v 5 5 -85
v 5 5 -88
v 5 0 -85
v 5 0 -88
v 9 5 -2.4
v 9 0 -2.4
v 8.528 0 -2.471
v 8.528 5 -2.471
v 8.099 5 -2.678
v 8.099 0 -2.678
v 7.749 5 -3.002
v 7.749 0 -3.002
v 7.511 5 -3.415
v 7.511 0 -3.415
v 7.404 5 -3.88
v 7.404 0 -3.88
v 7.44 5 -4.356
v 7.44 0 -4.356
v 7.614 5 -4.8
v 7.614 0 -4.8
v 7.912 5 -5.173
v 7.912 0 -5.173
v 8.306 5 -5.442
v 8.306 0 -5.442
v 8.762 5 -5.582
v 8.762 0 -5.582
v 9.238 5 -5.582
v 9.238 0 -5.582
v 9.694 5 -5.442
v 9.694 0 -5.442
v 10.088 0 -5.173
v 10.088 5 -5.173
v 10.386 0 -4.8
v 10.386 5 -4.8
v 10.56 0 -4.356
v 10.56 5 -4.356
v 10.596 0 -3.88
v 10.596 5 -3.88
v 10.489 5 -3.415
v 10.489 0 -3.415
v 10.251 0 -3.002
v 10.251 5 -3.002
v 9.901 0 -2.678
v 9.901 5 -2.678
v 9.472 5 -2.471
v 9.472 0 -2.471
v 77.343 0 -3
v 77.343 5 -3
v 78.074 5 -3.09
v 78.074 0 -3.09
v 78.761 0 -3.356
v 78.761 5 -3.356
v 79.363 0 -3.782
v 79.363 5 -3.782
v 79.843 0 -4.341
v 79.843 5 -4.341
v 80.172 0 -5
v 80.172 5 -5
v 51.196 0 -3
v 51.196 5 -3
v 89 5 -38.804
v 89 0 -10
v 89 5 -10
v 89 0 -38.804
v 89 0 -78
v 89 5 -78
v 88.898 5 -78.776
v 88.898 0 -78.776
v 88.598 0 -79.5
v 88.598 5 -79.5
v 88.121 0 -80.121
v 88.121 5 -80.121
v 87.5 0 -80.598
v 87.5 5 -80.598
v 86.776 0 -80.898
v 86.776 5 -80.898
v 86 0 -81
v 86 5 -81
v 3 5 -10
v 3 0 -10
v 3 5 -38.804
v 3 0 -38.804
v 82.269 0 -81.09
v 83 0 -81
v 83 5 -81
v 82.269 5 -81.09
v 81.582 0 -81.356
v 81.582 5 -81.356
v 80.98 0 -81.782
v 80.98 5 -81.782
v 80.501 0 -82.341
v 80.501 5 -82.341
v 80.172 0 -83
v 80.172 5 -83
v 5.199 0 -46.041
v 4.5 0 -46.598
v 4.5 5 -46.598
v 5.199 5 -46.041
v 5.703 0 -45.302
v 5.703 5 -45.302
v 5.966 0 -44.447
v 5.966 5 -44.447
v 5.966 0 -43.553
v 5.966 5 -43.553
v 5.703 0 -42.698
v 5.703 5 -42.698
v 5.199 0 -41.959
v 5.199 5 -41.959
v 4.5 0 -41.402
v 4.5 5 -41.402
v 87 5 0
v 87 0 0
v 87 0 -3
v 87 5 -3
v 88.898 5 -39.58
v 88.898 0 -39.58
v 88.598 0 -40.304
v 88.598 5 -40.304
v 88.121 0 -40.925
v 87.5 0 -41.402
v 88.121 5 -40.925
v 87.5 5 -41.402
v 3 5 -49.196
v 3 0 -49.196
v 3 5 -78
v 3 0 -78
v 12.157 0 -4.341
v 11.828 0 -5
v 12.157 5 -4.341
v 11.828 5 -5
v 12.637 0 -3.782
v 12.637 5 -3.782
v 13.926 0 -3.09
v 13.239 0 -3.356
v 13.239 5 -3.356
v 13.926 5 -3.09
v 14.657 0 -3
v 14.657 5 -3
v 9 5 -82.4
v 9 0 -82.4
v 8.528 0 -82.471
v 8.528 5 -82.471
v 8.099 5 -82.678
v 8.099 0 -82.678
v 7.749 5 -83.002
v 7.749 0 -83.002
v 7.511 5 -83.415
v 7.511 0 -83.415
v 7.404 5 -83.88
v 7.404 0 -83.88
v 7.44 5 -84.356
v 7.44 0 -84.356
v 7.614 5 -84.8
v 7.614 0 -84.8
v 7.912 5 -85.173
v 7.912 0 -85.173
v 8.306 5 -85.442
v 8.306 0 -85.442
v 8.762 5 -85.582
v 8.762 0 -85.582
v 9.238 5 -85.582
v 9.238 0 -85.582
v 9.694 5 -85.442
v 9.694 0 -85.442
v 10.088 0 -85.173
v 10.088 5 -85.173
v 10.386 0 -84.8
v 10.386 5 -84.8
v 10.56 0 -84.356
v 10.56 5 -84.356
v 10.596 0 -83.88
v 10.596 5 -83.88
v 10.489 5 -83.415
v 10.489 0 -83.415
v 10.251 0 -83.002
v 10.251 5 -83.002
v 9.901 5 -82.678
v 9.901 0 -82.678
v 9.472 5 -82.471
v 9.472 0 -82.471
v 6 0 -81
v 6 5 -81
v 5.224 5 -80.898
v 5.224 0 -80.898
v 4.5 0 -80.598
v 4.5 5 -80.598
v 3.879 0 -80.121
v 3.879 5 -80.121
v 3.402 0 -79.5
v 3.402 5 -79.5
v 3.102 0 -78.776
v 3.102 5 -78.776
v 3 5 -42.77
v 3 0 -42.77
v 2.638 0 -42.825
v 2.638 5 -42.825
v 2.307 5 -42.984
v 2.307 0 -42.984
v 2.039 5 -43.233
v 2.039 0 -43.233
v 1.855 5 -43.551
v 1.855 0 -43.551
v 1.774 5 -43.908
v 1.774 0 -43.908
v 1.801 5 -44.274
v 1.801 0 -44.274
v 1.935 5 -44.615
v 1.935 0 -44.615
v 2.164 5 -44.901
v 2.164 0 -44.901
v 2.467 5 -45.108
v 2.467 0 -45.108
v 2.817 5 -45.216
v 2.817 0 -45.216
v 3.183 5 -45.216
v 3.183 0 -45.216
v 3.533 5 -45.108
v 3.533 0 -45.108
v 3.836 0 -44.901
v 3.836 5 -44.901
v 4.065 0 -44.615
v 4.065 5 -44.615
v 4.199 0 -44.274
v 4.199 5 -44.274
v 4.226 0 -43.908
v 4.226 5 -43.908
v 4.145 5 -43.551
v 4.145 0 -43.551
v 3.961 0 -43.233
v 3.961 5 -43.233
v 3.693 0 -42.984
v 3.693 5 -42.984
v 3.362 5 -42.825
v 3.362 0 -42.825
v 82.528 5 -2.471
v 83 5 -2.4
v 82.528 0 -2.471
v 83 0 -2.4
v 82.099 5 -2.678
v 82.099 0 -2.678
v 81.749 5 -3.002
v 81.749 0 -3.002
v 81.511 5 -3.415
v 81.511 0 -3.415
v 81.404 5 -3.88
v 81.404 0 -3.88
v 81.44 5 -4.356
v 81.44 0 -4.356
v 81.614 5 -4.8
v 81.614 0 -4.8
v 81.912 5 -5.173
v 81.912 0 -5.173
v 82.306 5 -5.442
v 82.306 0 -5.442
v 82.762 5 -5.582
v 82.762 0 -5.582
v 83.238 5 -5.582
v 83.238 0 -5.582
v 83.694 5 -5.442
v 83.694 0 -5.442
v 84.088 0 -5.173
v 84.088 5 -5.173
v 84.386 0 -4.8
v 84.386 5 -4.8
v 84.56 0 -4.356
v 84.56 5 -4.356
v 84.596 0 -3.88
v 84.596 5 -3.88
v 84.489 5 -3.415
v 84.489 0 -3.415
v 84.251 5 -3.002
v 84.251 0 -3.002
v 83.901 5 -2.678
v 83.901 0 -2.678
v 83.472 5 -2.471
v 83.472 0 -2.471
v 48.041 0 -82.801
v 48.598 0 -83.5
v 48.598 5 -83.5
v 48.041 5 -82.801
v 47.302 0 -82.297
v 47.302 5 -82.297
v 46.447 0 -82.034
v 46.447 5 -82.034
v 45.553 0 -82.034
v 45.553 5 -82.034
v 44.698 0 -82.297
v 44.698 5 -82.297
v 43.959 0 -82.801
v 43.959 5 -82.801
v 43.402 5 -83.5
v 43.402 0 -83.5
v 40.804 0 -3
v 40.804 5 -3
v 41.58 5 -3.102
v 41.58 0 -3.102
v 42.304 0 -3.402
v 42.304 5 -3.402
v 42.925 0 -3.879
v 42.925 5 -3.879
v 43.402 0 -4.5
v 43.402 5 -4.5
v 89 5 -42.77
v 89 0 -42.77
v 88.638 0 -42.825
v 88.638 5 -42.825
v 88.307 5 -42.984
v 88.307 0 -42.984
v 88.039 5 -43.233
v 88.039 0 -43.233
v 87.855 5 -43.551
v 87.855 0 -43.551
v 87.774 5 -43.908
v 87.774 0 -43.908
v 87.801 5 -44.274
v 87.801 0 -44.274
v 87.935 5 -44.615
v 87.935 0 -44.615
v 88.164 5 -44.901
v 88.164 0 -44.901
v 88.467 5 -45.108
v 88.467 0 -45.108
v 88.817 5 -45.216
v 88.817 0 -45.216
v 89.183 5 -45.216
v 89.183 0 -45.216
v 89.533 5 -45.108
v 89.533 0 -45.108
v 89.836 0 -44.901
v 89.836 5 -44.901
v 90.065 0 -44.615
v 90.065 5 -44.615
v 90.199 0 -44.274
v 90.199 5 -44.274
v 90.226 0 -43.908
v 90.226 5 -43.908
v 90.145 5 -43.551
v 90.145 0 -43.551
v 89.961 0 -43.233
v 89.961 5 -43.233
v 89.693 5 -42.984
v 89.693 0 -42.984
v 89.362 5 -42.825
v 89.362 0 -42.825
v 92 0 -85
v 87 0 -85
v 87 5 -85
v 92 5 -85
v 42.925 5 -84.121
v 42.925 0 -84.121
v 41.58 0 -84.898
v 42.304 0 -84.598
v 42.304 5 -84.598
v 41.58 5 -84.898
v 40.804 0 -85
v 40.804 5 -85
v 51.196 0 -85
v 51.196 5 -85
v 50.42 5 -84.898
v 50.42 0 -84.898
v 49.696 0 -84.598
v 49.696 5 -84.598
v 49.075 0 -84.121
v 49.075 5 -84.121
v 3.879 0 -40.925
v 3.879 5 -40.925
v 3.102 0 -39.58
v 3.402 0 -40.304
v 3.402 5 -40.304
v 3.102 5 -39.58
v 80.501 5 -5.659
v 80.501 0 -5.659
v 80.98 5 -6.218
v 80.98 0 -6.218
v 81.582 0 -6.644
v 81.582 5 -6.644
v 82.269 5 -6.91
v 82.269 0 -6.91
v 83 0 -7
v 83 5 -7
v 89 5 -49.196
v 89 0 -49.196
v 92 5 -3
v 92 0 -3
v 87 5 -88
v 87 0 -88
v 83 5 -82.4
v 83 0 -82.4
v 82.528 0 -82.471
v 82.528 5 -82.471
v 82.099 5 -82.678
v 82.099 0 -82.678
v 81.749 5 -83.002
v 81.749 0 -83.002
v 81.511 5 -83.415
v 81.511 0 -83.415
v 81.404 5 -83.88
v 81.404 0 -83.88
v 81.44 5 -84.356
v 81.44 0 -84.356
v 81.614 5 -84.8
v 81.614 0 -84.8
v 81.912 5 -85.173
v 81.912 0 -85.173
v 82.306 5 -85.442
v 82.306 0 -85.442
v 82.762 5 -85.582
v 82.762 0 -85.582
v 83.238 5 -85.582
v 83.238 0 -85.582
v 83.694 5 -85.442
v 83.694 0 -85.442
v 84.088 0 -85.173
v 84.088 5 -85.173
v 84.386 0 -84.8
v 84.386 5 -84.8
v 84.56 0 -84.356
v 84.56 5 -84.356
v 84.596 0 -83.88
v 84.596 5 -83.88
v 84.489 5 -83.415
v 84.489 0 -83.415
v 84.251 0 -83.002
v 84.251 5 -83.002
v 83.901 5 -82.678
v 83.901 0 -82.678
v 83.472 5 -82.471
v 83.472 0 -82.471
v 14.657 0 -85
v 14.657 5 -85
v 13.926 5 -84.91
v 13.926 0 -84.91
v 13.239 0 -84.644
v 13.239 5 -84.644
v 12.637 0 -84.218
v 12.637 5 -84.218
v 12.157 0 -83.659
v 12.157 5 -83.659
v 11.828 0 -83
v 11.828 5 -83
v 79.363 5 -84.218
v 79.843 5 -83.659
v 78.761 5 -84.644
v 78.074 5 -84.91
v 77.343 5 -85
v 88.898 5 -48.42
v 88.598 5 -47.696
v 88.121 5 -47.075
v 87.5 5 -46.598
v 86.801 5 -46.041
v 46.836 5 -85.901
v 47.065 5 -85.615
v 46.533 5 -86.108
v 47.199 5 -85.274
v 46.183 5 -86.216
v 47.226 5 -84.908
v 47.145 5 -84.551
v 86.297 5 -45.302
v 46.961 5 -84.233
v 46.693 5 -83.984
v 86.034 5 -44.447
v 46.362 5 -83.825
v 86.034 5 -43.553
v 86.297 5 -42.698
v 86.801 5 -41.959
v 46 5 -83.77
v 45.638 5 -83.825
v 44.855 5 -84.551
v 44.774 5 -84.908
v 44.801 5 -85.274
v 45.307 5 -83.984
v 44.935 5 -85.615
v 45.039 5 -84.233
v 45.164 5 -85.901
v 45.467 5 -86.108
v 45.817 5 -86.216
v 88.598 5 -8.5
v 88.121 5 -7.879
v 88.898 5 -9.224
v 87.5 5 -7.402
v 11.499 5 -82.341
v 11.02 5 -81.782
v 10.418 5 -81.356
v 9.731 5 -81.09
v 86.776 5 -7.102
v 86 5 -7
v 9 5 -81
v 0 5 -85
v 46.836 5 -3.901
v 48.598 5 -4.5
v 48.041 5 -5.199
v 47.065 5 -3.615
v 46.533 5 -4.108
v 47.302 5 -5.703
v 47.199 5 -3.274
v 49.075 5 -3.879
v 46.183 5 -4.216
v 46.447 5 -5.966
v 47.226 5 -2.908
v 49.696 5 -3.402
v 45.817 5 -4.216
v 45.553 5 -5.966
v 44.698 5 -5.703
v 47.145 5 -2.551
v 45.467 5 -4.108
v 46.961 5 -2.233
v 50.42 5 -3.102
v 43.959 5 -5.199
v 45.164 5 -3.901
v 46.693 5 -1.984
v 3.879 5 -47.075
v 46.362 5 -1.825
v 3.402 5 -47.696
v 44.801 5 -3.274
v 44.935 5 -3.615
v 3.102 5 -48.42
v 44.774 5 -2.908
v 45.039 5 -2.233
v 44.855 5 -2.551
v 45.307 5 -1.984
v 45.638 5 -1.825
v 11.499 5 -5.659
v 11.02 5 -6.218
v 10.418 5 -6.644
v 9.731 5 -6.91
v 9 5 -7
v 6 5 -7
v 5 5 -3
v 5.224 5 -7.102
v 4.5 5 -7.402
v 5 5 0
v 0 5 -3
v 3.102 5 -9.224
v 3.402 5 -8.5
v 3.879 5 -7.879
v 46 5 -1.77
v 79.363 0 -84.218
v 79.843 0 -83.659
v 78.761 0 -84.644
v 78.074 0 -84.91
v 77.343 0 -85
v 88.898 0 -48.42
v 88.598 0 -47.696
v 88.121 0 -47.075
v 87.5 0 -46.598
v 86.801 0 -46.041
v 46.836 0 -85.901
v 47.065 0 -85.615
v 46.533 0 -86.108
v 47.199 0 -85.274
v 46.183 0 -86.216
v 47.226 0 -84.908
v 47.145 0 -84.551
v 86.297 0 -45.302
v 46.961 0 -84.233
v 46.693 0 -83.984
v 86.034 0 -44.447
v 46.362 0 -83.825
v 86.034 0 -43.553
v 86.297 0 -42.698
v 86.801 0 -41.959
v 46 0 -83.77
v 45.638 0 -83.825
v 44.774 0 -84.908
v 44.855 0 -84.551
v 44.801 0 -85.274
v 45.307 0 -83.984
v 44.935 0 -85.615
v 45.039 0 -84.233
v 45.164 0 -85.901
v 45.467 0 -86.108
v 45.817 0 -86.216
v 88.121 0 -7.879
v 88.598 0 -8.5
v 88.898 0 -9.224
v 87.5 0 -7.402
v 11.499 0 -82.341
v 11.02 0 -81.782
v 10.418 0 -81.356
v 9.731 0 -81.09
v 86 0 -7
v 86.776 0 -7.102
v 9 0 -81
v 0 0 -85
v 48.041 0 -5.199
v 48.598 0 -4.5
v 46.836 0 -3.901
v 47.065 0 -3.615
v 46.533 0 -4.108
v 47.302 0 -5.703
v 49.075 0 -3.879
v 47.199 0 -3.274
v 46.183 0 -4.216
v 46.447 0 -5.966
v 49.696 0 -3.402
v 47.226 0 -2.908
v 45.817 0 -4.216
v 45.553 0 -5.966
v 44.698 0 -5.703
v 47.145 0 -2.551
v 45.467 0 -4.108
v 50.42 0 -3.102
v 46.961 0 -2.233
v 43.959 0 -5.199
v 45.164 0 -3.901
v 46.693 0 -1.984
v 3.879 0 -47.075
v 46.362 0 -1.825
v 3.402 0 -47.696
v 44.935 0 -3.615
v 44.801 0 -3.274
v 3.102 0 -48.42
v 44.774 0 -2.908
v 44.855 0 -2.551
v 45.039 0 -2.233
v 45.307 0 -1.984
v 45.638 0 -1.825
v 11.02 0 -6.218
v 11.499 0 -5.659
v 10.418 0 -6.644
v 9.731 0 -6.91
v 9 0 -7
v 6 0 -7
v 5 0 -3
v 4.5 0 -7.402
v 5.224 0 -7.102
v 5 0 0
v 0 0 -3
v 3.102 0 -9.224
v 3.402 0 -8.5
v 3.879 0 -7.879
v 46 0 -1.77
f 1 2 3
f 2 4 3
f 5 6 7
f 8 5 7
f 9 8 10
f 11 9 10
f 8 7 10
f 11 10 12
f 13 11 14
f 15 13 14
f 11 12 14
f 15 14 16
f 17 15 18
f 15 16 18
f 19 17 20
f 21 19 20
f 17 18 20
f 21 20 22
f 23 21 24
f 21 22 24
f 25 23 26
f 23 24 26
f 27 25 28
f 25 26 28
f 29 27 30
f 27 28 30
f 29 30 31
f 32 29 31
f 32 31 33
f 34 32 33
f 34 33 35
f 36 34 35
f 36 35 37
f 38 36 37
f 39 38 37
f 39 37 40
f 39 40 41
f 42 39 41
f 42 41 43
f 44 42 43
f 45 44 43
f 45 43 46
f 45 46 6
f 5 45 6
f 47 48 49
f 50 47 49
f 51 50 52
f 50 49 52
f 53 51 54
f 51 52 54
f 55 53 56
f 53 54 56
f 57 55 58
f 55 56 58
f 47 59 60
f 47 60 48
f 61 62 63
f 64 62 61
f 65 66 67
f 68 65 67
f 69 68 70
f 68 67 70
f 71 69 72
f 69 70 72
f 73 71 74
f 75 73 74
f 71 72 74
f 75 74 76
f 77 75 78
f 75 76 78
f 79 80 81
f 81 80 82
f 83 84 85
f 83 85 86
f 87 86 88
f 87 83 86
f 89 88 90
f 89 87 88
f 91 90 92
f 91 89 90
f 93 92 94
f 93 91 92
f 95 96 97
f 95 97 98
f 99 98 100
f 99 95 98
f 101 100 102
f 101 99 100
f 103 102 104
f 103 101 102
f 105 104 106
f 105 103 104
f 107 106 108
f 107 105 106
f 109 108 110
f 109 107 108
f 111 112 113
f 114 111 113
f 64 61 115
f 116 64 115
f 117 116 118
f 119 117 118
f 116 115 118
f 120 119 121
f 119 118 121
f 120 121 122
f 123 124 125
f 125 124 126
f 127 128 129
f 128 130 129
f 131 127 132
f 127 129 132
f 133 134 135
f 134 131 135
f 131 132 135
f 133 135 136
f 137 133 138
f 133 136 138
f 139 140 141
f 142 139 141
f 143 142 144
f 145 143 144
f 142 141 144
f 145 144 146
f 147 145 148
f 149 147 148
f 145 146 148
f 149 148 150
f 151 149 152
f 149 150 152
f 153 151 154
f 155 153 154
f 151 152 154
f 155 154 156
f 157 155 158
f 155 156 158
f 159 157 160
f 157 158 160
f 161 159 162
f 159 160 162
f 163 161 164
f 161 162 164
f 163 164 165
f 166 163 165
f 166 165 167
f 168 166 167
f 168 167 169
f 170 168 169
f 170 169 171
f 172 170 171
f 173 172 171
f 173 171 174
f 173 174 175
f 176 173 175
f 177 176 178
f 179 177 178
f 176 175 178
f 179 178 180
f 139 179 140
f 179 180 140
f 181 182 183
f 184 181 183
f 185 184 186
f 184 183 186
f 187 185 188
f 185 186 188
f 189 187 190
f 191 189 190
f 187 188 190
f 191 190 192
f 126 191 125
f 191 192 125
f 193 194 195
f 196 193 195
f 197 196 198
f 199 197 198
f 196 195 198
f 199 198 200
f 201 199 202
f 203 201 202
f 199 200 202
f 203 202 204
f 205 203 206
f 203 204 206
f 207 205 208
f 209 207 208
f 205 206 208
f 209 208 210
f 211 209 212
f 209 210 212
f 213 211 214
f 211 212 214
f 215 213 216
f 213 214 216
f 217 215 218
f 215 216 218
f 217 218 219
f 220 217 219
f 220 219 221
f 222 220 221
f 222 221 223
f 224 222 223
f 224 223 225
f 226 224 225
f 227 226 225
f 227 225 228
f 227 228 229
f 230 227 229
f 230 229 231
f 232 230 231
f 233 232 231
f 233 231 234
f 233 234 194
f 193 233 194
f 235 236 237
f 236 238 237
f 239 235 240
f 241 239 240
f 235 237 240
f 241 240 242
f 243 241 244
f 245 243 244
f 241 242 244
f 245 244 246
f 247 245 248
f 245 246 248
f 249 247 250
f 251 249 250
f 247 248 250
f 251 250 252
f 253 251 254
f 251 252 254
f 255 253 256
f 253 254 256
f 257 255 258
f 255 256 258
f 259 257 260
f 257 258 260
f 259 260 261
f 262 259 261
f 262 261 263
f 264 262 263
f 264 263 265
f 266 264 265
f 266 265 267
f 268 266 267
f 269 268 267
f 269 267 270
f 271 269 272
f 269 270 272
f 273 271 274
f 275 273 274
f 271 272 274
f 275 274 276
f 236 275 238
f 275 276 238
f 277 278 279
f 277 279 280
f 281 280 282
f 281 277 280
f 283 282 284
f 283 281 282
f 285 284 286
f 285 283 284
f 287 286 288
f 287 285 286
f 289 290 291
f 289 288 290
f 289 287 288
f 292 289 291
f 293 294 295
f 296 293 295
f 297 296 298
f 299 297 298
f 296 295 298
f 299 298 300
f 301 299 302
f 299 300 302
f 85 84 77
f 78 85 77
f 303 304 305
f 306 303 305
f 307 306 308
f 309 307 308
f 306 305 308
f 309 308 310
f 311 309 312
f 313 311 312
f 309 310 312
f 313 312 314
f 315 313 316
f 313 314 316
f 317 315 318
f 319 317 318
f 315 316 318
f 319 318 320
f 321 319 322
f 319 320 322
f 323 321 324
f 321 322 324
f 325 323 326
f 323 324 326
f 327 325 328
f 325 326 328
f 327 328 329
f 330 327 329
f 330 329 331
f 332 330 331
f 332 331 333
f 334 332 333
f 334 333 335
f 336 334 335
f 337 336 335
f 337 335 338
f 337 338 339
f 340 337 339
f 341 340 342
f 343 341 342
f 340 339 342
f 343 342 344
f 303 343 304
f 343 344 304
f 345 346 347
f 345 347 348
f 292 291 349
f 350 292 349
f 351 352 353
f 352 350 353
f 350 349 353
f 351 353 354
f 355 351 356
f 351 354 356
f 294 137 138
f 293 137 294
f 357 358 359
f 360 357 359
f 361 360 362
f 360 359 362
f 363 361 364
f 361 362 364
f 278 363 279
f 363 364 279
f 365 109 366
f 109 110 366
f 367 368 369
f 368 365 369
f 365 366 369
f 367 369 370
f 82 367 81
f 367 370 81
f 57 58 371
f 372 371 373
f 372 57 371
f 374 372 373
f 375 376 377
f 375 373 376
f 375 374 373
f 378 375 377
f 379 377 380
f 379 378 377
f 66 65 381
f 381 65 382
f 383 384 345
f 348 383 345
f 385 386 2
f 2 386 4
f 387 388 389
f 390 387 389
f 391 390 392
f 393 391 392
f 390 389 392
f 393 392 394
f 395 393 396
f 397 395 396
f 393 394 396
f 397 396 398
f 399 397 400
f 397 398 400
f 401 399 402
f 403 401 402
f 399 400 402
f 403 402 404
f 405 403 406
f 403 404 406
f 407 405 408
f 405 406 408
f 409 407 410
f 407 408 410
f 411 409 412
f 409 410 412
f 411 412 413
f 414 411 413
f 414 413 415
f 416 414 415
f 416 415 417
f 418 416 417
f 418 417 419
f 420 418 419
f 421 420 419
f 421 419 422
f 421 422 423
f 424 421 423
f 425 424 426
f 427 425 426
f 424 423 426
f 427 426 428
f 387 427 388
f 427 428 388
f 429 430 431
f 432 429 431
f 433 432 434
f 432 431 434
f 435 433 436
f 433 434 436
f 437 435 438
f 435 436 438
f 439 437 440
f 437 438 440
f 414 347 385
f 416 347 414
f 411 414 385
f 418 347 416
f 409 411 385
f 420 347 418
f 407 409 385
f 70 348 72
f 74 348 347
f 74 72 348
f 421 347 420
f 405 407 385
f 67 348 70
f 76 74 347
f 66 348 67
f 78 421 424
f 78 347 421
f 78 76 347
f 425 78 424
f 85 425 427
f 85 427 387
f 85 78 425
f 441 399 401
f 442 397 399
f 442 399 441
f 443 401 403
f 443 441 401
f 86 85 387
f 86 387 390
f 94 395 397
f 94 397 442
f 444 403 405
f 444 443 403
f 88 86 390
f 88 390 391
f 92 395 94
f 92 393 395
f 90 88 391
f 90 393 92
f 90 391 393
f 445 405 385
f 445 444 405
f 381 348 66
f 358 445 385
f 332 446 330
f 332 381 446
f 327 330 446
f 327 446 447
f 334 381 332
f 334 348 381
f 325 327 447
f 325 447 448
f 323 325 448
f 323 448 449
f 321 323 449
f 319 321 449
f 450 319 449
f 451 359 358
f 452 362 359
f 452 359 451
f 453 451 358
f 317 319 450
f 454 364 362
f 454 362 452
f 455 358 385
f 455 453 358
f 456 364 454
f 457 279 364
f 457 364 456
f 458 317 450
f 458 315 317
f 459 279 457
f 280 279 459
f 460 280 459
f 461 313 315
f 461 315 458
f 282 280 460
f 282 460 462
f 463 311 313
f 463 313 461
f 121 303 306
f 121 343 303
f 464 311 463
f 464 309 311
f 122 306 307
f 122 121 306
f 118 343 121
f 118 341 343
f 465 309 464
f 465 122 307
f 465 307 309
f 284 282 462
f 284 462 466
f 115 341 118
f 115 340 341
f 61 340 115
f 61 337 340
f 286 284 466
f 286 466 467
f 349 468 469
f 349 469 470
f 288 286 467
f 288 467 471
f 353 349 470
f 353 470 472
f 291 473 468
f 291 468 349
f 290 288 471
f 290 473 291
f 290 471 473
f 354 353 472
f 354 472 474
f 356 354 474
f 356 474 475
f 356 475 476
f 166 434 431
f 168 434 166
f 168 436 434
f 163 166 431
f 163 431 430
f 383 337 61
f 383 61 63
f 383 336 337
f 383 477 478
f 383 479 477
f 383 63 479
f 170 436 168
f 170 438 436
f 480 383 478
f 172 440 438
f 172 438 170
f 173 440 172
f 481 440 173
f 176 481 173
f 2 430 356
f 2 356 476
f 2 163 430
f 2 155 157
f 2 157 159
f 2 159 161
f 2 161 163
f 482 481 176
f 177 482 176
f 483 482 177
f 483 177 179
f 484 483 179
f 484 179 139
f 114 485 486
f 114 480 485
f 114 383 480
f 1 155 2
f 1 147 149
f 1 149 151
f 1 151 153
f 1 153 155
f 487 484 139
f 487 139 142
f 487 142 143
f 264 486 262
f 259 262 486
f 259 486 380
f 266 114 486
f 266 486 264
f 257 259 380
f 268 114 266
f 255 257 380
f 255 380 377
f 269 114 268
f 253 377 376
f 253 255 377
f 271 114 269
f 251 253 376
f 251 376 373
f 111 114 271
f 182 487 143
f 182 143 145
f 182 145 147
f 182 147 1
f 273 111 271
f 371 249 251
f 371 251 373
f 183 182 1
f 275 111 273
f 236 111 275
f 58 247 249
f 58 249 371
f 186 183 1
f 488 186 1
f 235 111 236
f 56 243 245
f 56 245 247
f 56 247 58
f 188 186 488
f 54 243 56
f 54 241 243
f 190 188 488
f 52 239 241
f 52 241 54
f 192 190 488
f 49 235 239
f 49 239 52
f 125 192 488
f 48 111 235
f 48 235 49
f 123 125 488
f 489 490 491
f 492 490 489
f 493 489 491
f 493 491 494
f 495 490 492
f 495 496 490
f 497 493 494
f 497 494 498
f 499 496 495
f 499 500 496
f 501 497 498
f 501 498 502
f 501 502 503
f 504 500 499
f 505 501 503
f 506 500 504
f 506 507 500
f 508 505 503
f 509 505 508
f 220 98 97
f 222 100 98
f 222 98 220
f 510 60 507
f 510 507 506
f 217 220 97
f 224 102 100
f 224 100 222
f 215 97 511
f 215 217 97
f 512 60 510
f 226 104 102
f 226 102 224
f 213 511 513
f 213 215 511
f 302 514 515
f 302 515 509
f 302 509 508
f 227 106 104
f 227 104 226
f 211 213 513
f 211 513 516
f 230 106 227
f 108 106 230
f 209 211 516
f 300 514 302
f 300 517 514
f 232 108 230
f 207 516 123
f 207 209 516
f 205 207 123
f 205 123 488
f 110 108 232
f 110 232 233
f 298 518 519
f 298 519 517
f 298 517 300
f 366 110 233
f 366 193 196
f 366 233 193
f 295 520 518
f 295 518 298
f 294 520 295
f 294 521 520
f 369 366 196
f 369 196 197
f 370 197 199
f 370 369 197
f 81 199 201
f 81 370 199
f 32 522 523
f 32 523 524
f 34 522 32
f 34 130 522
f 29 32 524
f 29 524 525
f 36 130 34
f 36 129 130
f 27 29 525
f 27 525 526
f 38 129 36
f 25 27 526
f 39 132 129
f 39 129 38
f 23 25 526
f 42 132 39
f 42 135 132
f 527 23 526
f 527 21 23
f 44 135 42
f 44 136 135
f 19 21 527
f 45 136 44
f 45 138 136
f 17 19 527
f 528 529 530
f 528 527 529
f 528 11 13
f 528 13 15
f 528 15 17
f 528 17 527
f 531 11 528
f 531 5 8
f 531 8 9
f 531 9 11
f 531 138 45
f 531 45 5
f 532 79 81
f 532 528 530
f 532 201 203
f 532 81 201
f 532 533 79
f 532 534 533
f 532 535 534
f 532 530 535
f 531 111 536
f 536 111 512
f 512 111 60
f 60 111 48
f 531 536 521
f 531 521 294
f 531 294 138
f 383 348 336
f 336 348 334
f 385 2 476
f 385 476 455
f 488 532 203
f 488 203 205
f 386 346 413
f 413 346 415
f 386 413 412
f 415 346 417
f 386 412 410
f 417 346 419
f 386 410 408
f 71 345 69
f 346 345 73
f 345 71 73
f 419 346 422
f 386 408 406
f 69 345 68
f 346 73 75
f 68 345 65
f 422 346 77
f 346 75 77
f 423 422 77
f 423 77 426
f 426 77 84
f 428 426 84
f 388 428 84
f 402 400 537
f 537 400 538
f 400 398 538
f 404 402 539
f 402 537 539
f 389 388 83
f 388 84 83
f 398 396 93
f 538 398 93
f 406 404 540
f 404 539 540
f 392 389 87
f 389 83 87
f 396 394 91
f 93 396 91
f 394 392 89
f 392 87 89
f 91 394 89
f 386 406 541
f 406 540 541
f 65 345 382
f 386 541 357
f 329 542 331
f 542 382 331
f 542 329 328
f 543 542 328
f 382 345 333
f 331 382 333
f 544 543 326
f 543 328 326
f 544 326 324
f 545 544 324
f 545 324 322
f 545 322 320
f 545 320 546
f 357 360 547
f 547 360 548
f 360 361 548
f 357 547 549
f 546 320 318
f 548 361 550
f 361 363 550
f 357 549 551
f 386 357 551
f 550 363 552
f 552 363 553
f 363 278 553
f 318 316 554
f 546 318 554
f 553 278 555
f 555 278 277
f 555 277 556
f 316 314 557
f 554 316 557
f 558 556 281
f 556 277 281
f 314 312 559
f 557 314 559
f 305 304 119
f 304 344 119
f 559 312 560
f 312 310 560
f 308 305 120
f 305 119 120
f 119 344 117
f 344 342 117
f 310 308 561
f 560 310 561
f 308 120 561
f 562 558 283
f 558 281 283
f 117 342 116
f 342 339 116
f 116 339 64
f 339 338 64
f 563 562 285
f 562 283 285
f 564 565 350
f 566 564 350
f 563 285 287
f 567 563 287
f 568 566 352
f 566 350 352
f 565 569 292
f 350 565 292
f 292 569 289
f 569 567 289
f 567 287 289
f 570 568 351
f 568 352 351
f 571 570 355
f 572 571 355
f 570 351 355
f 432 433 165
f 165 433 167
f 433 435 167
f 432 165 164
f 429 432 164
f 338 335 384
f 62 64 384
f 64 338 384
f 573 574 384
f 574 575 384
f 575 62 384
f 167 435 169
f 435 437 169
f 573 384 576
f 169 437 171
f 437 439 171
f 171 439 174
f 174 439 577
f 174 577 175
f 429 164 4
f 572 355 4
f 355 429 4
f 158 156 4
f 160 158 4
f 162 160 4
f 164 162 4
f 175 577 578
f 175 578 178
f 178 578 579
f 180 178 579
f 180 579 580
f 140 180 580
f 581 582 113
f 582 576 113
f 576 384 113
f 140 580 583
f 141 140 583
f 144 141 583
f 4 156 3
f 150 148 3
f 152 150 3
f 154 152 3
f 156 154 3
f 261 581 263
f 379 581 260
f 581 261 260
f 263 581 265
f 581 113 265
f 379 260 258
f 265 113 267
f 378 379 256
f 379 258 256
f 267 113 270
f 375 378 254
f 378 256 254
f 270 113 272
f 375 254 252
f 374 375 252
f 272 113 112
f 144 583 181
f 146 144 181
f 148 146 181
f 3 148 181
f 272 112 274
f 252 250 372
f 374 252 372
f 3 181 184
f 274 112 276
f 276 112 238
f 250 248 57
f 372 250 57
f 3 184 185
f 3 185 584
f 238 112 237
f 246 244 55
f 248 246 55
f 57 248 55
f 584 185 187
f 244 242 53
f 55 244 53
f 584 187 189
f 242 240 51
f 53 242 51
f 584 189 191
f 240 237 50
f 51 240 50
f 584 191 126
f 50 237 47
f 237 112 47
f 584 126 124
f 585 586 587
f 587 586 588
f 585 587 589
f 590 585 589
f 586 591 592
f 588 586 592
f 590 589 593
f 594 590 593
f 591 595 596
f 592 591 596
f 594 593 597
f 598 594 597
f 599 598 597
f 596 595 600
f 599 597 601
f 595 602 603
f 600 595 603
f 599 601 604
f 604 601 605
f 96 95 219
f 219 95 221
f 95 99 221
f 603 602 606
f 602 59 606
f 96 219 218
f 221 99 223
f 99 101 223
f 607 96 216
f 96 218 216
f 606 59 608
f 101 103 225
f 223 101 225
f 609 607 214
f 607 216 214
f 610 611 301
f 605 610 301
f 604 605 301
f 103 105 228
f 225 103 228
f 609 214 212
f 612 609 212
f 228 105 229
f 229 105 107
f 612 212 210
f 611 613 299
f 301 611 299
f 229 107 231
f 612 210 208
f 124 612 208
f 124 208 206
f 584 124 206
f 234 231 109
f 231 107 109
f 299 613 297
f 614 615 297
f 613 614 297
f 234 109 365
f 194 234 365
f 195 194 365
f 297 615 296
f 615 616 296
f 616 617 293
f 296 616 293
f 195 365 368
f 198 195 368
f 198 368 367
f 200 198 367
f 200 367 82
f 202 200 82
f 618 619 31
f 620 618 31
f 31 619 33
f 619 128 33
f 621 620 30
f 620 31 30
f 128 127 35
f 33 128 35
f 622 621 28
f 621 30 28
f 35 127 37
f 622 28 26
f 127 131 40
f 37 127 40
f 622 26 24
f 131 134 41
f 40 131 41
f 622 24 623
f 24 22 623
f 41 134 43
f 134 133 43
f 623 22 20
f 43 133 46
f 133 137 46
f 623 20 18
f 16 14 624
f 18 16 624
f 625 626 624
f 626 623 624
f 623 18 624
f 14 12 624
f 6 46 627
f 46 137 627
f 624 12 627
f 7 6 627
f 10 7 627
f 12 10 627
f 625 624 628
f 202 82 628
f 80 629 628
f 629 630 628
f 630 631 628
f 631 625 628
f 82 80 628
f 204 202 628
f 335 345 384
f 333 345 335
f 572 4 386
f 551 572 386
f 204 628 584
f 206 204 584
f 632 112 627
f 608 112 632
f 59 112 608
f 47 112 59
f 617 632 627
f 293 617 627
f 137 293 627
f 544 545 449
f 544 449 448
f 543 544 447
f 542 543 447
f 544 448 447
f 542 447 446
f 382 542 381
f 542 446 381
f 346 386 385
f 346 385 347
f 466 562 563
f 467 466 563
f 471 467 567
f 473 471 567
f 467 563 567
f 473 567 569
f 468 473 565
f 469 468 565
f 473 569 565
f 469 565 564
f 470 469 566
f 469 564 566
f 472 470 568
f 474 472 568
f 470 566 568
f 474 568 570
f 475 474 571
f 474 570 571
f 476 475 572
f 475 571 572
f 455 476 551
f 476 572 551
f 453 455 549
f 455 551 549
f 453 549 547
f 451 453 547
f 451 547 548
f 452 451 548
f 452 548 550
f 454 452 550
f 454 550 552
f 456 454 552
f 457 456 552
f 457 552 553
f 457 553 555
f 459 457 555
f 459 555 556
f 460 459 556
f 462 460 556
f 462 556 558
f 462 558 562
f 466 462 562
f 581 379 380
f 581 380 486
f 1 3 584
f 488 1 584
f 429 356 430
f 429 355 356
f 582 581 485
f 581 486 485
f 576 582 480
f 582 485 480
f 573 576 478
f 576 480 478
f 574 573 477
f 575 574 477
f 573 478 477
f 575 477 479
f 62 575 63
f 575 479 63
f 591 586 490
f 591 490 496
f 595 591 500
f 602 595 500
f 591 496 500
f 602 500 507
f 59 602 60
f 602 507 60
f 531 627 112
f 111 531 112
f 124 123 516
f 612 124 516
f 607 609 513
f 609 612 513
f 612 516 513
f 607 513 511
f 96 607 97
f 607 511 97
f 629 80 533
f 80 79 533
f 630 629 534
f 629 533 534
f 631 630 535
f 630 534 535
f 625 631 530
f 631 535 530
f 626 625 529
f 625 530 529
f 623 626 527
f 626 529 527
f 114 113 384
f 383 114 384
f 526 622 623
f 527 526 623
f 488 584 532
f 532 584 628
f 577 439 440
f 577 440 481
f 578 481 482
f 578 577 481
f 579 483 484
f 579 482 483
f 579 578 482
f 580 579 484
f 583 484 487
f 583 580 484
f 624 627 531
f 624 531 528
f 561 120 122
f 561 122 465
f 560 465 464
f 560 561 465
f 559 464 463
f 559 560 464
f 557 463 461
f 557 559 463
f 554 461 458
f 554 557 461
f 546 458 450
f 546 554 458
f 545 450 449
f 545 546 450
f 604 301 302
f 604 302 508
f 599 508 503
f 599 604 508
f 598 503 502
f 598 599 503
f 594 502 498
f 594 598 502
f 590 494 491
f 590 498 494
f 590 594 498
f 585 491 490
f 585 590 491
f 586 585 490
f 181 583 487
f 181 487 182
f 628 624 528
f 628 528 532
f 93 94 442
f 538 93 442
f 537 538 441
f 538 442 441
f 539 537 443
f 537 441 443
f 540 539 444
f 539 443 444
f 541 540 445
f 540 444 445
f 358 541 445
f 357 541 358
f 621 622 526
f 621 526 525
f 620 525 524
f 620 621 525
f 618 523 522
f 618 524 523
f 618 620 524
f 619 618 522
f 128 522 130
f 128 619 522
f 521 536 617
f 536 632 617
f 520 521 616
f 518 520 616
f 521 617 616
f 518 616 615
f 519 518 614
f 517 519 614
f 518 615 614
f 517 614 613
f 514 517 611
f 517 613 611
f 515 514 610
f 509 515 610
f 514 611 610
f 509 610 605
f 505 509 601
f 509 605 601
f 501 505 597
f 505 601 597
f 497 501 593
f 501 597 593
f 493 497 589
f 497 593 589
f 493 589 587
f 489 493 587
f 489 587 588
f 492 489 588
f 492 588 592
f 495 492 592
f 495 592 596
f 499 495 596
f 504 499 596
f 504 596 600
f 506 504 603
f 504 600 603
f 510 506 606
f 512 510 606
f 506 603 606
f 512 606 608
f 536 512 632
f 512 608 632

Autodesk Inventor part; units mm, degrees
ref_plane "YZ Plane" through (0, 0, 0) normal (1, 0, 0) x (0, 1, 0)
ref_plane "XZ Plane" through (0, 0, 0) normal (0, 1, 0) x (-1, 0, 0)
ref_plane "XY Plane" through (0, 0, 0) normal (0, 0, 1) x (1, 0, 0)
sketch "Sketch1" plane through (0, 0, 0) normal (0, 1, 0) x (-1, 0, 0)
  line L0 (0, 0) -> (-92, 0)
  line L1 (-92, 0) -> (-92, -88)
  line L2 (-92, -88) -> (0, -88)
  line L3 (0, -88) -> (0, 0)
  line L4 (0, -88) -> (-5, -88)
  line L5 (-5, -88) -> (-5, -85)
  line L6 (-5, -85) -> (0, -85)
  line L7 (0, -85) -> (0, -88)
  line L8 (0, 0) -> (-5, 0)
  line L9 (-5, 0) -> (-5, -3)
  line L10 (-5, -3) -> (0, -3)
  line L11 (0, -3) -> (0, 0)
  line L12 (-92, 0) -> (-87, 0)
  line L13 (-87, 0) -> (-87, -3)
  line L14 (-87, -3) -> (-92, -3)
  line L15 (-92, -3) -> (-92, 0)
  line L16 (-92, -88) -> (-87, -88)
  line L17 (-87, -88) -> (-87, -85)
  line L18 (-87, -85) -> (-92, -85)
  line L19 (-92, -85) -> (-92, -88)
  circle A0 centre (-9, -84) radius 1.6 construction
  circle A1 centre (-83, -84) radius 1.6 construction
  circle A2 centre (-9, -4) radius 1.6 construction
  circle A3 centre (-83, -4) radius 1.6 construction
  circle A4 centre (-46, -85) radius 1.6 construction
  circle A5 centre (-3, -44) radius 1.6 construction
  circle A6 centre (-89, -44) radius 1.6 construction
  circle A7 centre (-46, -3) radius 1.6 construction
  circle A8 centre (-9, -84) radius 3
  circle A9 centre (-46, -85) radius 3
  circle A10 centre (-83, -84) radius 3
  circle A11 centre (-3, -44) radius 3
  circle A12 centre (-9, -4) radius 3
  circle A13 centre (-83, -4) radius 3
  circle A14 centre (-89, -44) radius 3
  circle A15 centre (-46, -3) radius 3
  line L20 (-11.8284, -3) -> (-43, -3)
  line L21 (-49, -3) -> (-80.1716, -3)
  line L22 (-83, -7) -> (-89, -7)
  line L23 (-89, -7) -> (-89, -41)
  line L24 (-83, -81) -> (-89, -81)
  line L25 (-89, -81) -> (-89, -47)
  line L26 (-80.1716, -85) -> (-49, -85)
  line L27 (-43, -85) -> (-11.8284, -85)
  line L28 (-9, -81) -> (-3, -81)
  line L29 (-9, -7) -> (-3, -7)
  line L30 (-3, -7) -> (-3, -41)
  line L31 (-3, -47) -> (-3, -81)
  point P0 (-92, -44)
  point P1 (-46, 0)
  dimension "d0" = 82
  dimension "d1" = 88
  dimension "d2" = 92
  dimension "d3" = 5
  dimension "d4" = 3.2
  dimension "d5" = 74
  dimension "d6" = 80
  dimension "d7" = 9
  dimension "d8" = 4
  dimension "d9" = 3.2
  dimension "d10" = 46
  dimension "d11" = 44
  dimension "d12" = 3
  dimension "d13" = 3
  dimension "d14" = 3
  dimension "d15" = 3
  dimension "d16" = 6
  dimension "d17" = 3
  dimension "d18" = 3
  dimension "d19" = 3
  dimension "d20" = 3
extrude "Extrusion1" add sketch "Sketch1" along normal blind 5 contours L9 L10 L3 A11 L30 L29 A12 L20 A15 L0 | A15 L21 A13 L22 L23 A14 L1 L14 L13 L0 | A15 | A11 | L3 L6 L5 L2 A9 L27 A8 L28 L31 A11 | A12 | A13 | A8 | A14 L25 L24 A10 L26 A9 L2 L17 L18 L1 | A14 | A9 | A10
fillet "Fillet1" radius 3 16 edges at (3, 2.5, -7) (11.8284, 2.5, -3) (43, 2.5, -3) (49, 2.5, -3) (80.1716, 2.5, -3) (89, 2.5, -7) (89, 2.5, -41) (89, 2.5, -47) (3, 2.5, -41) (3, 2.5, -47) (3, 2.5, -81) (11.8284, 2.5, -85) (43, 2.5, -85) (49, 2.5, -85) (89, 2.5, -81) (80.1716, 2.5, -85)
sketch "Sketch2" plane through (0, 5, 0) normal (0, 1, 0) x (1, 0, 0)
  arc A0 (87.5, 46.5981) -> (87.5, 41.4019) centre (89, 44) ccw projected
  arc A1 (43.4019, 83.5) -> (48.5981, 83.5) centre (46, 85) ccw projected
  arc A2 (4.5, 41.4019) -> (4.5, 46.5981) centre (3, 44) ccw projected
  arc A3 (48.5981, 4.5) -> (43.4019, 4.5) centre (46, 3) ccw projected
  point P0 (0, 0)
  point P1 (92, 44)
  point P2 (46, 0)
hole "Hole1" at (46, 5, -85) at (3, 5, -44) at (89, 5, -44) at (46, 5, -3) direction (0, -1, 0) diameter 2.459 end through all thread size "M3x0.5" class "6H" standard "ANSI Metric M Profile"
sketch "Sketch3" plane through (0, 5, 0) normal (0, 1, 0) x (1, 0, 0)
  arc A0 (9, 81) -> (11.8284, 83) centre (9, 84) ccw projected
  arc A1 (11.8284, 5) -> (9, 7) centre (9, 4) ccw projected
  arc A2 (80.1716, 83) -> (83, 81) centre (83, 84) ccw projected
  arc A3 (83, 7) -> (80.1716, 5) centre (83, 4) ccw projected
  point P0 (0, 0)
  point P1 (84, 6)
hole "Hole2" at (9, 5, -84) at (9, 5, -4) at (83, 5, -4) at (83, 5, -84) direction (0, -1, 0) diameter 3.2 end through all clearance for "Flat Head Machine Screw" size "M3" standard "Ansi Metric M Profile"
equation "\"d7\" = -0.5 * d5 + 0.5 * d2"
equation "\"d8\" = -0.5 * d6 + 0.5 * d1"
equation "\"d10\" = 0.5 * d2"
equation "\"d11\" = 0.5 * d1"
equation "\"d13\" = d12"
equation "\"d15\" = d14"
equation "\"d17\" = d19"
equation "\"d18\" = d20"
properties part number "ElectronicsBayUpperMount"
